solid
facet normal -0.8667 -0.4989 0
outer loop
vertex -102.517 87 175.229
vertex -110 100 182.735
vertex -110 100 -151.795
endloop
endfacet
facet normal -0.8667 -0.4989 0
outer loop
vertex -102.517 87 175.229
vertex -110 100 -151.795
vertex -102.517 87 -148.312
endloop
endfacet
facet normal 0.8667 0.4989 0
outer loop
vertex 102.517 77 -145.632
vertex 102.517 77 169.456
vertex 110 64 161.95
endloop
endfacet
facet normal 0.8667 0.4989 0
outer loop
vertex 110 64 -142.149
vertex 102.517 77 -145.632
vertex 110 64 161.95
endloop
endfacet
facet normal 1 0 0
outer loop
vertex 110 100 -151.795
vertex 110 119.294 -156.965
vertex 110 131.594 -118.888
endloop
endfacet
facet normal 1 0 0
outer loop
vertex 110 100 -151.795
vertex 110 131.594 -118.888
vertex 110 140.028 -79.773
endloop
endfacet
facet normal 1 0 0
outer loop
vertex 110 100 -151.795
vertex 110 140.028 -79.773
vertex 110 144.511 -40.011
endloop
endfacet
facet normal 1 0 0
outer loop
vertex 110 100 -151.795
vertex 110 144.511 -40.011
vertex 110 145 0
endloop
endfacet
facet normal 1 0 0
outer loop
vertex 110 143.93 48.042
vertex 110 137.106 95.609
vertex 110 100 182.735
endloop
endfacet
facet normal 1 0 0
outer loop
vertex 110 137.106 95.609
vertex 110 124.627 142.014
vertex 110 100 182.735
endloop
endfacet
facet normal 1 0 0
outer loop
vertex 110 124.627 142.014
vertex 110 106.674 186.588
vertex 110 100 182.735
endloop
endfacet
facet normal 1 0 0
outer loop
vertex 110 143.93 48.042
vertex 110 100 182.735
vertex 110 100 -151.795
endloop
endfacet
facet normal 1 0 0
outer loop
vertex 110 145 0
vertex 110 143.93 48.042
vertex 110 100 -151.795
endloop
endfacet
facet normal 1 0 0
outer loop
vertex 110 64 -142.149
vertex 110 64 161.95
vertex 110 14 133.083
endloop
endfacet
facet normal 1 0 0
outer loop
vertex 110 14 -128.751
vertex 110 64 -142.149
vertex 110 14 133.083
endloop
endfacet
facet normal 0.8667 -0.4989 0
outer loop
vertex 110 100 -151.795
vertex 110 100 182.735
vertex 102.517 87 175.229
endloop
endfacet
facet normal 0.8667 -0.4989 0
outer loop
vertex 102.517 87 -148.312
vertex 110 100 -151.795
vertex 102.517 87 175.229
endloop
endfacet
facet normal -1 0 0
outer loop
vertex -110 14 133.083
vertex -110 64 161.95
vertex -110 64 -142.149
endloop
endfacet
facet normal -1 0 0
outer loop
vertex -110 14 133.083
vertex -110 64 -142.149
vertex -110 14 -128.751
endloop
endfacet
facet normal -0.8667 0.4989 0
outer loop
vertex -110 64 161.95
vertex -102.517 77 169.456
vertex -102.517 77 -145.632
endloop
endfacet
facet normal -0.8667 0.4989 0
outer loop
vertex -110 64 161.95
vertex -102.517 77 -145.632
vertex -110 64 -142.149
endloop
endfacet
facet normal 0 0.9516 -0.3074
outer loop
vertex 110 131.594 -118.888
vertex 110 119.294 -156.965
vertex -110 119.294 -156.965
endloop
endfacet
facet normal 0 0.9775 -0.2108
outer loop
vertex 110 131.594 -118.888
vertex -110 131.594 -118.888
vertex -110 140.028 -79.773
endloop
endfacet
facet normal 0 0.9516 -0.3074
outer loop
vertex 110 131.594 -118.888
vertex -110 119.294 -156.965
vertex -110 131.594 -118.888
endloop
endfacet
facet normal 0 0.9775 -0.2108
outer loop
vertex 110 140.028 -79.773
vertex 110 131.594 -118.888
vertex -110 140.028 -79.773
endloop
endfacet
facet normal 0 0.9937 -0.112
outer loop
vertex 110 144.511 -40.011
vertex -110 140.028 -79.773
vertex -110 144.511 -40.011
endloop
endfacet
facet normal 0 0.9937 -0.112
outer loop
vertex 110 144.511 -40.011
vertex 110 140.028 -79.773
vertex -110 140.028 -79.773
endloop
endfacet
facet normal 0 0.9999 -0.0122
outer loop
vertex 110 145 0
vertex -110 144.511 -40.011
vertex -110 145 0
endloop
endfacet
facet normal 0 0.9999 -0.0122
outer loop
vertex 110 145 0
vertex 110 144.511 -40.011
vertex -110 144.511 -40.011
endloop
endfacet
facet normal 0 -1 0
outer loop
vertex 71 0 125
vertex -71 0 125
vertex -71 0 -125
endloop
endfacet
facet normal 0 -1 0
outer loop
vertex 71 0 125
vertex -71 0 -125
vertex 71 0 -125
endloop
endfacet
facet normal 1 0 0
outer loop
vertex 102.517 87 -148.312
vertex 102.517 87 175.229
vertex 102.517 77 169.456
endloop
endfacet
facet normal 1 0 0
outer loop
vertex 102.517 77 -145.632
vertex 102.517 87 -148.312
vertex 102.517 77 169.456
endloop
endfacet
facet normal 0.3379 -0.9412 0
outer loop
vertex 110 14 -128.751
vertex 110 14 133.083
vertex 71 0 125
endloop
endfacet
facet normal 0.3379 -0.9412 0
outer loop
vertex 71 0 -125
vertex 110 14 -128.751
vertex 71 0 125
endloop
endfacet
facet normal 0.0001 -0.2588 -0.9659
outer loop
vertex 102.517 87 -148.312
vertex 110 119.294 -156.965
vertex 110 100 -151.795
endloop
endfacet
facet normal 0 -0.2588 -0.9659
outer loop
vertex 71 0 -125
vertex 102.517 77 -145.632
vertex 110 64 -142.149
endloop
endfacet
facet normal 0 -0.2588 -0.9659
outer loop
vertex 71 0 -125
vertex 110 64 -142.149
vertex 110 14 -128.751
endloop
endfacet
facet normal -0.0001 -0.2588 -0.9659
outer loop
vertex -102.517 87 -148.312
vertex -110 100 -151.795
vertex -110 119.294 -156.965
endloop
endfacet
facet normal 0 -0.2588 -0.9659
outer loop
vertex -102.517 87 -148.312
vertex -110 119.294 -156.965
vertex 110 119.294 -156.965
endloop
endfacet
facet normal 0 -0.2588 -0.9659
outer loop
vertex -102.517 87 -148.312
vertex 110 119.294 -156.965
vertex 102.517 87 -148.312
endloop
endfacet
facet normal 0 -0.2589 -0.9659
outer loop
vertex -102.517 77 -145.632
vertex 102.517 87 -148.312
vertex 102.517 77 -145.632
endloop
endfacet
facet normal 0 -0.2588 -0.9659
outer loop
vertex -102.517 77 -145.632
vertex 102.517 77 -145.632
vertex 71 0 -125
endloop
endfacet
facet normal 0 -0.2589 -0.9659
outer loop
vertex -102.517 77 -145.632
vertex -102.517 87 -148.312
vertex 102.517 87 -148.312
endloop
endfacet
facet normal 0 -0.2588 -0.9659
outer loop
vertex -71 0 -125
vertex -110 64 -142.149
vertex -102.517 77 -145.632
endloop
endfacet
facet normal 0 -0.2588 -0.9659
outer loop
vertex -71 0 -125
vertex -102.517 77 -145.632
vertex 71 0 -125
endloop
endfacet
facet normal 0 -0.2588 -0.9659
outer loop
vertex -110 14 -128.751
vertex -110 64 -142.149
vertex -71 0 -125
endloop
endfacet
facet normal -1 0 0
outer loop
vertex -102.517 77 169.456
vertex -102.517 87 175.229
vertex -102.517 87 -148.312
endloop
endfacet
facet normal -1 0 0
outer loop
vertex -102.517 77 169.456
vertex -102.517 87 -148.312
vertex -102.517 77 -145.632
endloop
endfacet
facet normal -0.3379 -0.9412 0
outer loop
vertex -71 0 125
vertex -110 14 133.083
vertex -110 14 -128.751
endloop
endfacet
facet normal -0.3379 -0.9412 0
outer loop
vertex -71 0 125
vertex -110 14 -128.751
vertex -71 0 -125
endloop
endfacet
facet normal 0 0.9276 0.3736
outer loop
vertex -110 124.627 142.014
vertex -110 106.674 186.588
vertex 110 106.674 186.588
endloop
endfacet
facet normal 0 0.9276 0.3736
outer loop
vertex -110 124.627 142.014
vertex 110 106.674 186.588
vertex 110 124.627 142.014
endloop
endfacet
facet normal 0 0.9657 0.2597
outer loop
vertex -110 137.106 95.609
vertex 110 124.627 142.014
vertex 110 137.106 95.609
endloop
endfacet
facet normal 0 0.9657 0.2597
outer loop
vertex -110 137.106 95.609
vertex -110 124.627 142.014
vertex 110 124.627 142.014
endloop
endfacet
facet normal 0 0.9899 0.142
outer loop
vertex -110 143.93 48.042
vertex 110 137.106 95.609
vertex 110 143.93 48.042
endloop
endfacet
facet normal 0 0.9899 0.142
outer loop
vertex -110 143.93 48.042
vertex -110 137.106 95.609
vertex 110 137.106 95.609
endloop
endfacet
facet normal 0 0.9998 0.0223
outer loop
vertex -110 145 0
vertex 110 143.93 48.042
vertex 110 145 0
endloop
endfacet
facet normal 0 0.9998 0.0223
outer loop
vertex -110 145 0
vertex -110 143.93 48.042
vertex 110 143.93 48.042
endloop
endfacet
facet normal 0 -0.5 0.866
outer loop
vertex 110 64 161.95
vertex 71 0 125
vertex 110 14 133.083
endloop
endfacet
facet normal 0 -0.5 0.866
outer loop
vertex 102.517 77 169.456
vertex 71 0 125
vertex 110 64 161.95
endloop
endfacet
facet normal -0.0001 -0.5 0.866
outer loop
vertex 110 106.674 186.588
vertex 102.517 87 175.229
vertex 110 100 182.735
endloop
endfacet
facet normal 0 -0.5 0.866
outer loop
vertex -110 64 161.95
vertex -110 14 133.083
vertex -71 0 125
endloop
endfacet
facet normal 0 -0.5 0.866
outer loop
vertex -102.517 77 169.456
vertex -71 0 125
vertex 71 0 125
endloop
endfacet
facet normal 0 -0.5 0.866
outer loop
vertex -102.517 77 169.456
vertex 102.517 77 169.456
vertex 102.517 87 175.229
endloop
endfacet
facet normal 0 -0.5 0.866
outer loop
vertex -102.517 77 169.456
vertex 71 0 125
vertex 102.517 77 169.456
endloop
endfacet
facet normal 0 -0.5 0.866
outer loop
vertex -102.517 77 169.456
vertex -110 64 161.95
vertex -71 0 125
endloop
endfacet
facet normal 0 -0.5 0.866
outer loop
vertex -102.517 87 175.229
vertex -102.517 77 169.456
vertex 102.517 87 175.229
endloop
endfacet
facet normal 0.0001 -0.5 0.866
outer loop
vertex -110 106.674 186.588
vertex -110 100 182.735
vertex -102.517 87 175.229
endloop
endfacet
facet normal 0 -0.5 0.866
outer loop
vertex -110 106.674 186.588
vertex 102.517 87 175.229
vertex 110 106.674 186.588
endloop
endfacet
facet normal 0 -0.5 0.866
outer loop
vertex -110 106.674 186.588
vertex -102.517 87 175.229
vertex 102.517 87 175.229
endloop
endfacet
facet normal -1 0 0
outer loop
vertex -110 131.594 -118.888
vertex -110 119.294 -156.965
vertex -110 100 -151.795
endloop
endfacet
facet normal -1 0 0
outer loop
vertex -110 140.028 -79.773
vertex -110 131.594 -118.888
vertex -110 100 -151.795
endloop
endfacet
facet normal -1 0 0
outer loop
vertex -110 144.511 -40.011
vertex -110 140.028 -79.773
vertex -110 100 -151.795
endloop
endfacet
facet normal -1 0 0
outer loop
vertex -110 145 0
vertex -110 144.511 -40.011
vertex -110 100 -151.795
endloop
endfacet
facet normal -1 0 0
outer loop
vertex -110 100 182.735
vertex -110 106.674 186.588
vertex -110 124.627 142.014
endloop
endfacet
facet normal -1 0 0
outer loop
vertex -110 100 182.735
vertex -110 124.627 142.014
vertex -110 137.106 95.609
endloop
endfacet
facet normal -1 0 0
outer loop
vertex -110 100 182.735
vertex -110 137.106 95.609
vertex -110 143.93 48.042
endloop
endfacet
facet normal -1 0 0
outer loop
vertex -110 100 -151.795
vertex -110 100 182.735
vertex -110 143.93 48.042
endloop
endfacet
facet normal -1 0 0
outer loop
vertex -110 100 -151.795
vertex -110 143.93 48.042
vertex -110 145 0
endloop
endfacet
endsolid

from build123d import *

# Parameters (mm, degrees)
BOSS_EXTRU_1_DEPTH      = 200
ENL_V_MAT_EXTRU_1_DEPTH = 274.130005675
SYM_TRIE2_COPY_1_DEPTH  = 200
SYM_TRIE2_COPY_2_DEPTH  = 274.130005675
SYM_TRIE2_COPY_3_DEPTH  = 274.130005675
INTERSECT1_START        = -110
INTERSECT1_DEPTH        = 220


# Read off the part's stored shape, not the designer's step: Intersect1
with BuildPart() as part:
    # Esquisse1 → Boss.-Extru.1 (new body)
    with BuildSketch(Plane.XY):
        Polygon((0, 0), (0, 150), (110, 150), (110, 100), (102.516685226, 87), (102.516685226, 77), (110, 64), (110, 14), (71, 0), align=None)
    boss_extru_1 = extrude(amount=BOSS_EXTRU_1_DEPTH)

    # Esquisse5 → Enlèv. mat.-Extru.1 (cut, symmetric)
    with BuildSketch(Plane(origin=(0, 0, 0), x_dir=(0, 0, -1), z_dir=(1, 0, 0))):
        with BuildLine():
            Line((0, 150), (-200, 150))
            Line((-200, 150), (-200, 100))
            ThreePointArc((-200, 100), (-102.931757397, 135.530032876), (0, 145))
            Line((0, 145), (0, 150))
        make_face()
    enl_v_mat_extru_1 = extrude(amount=ENL_V_MAT_EXTRU_1_DEPTH, both=True, mode=Mode.SUBTRACT)

    # Symétrie1: Boss.-Extru.1, Enlèv. mat.-Extru.1 across plane
    add(boss_extru_1.mirror(Plane.XY))
    add(enl_v_mat_extru_1.mirror(Plane.XY), mode=Mode.SUBTRACT)

    # Symétrie2: Boss.-Extru.1 across plane
    add(boss_extru_1.mirror(Plane(origin=(0, 0, 0), x_dir=(0, 0, 1), z_dir=(1, 0, 0))))

    # Symétrie2 copy 1 sketch → Symétrie2 copy 1 (add)
    with BuildSketch(Plane(origin=(0, 0, 0), x_dir=(-1, 0, 0), z_dir=(0, 0, -1))):
        Polygon((0, 0), (0, 150), (110, 150), (110, 100), (102.516685226, 87), (102.516685226, 77), (110, 64), (110, 14), (71, 0), align=None)
    extrude(amount=SYM_TRIE2_COPY_1_DEPTH)

    # Symétrie2 copy 2 sketch → Symétrie2 copy 2 (cut, symmetric)
    with BuildSketch(Plane.ZY):
        with BuildLine():
            Line((0, 150), (-200, 150))
            Line((-200, 150), (-200, 100))
            ThreePointArc((-200, 100), (-102.931757397, 135.530032876), (0, 145))
            Line((0, 145), (0, 150))
        make_face()
    extrude(amount=SYM_TRIE2_COPY_2_DEPTH, both=True, mode=Mode.SUBTRACT)

    # Symétrie2 copy 3 sketch → Symétrie2 copy 3 (cut, symmetric)
    with BuildSketch(Plane(origin=(0, 0, 0), x_dir=(0, 0, -1), z_dir=(-1, 0, 0))):
        with BuildLine():
            Line((0, -150), (-200, -150))
            Line((-200, -150), (-200, -100))
            ThreePointArc((-200, -100), (-102.931757397, -135.530032876), (0, -145))
            Line((0, -145), (0, -150))
        make_face()
    extrude(amount=SYM_TRIE2_COPY_3_DEPTH, both=True, mode=Mode.SUBTRACT)

    # Intersect1 outline → Intersect1 (cut)
    with BuildSketch(Plane.YZ.offset(INTERSECT1_START)):
        with BuildLine():
            ThreePointArc((100, -200), (110.281899779, -178.766997787), (119.294166687, -156.964775625))
            Line((119.294166687, -156.964775625), (0, -125))
            Line((0, -125), (0, -200))
            Line((0, -200), (100, -200))
        make_face()
        with BuildLine():
            Line((0, 200), (0, 125))
            Line((0, 125), (106.673784722, 186.588138325))
            ThreePointArc((106.673784722, 186.588138325), (103.399684527, 193.325314743), (100, 200))
            Line((100, 200), (0, 200))
        make_face()
    extrude(amount=INTERSECT1_DEPTH, mode=Mode.SUBTRACT)


solid = part.part
